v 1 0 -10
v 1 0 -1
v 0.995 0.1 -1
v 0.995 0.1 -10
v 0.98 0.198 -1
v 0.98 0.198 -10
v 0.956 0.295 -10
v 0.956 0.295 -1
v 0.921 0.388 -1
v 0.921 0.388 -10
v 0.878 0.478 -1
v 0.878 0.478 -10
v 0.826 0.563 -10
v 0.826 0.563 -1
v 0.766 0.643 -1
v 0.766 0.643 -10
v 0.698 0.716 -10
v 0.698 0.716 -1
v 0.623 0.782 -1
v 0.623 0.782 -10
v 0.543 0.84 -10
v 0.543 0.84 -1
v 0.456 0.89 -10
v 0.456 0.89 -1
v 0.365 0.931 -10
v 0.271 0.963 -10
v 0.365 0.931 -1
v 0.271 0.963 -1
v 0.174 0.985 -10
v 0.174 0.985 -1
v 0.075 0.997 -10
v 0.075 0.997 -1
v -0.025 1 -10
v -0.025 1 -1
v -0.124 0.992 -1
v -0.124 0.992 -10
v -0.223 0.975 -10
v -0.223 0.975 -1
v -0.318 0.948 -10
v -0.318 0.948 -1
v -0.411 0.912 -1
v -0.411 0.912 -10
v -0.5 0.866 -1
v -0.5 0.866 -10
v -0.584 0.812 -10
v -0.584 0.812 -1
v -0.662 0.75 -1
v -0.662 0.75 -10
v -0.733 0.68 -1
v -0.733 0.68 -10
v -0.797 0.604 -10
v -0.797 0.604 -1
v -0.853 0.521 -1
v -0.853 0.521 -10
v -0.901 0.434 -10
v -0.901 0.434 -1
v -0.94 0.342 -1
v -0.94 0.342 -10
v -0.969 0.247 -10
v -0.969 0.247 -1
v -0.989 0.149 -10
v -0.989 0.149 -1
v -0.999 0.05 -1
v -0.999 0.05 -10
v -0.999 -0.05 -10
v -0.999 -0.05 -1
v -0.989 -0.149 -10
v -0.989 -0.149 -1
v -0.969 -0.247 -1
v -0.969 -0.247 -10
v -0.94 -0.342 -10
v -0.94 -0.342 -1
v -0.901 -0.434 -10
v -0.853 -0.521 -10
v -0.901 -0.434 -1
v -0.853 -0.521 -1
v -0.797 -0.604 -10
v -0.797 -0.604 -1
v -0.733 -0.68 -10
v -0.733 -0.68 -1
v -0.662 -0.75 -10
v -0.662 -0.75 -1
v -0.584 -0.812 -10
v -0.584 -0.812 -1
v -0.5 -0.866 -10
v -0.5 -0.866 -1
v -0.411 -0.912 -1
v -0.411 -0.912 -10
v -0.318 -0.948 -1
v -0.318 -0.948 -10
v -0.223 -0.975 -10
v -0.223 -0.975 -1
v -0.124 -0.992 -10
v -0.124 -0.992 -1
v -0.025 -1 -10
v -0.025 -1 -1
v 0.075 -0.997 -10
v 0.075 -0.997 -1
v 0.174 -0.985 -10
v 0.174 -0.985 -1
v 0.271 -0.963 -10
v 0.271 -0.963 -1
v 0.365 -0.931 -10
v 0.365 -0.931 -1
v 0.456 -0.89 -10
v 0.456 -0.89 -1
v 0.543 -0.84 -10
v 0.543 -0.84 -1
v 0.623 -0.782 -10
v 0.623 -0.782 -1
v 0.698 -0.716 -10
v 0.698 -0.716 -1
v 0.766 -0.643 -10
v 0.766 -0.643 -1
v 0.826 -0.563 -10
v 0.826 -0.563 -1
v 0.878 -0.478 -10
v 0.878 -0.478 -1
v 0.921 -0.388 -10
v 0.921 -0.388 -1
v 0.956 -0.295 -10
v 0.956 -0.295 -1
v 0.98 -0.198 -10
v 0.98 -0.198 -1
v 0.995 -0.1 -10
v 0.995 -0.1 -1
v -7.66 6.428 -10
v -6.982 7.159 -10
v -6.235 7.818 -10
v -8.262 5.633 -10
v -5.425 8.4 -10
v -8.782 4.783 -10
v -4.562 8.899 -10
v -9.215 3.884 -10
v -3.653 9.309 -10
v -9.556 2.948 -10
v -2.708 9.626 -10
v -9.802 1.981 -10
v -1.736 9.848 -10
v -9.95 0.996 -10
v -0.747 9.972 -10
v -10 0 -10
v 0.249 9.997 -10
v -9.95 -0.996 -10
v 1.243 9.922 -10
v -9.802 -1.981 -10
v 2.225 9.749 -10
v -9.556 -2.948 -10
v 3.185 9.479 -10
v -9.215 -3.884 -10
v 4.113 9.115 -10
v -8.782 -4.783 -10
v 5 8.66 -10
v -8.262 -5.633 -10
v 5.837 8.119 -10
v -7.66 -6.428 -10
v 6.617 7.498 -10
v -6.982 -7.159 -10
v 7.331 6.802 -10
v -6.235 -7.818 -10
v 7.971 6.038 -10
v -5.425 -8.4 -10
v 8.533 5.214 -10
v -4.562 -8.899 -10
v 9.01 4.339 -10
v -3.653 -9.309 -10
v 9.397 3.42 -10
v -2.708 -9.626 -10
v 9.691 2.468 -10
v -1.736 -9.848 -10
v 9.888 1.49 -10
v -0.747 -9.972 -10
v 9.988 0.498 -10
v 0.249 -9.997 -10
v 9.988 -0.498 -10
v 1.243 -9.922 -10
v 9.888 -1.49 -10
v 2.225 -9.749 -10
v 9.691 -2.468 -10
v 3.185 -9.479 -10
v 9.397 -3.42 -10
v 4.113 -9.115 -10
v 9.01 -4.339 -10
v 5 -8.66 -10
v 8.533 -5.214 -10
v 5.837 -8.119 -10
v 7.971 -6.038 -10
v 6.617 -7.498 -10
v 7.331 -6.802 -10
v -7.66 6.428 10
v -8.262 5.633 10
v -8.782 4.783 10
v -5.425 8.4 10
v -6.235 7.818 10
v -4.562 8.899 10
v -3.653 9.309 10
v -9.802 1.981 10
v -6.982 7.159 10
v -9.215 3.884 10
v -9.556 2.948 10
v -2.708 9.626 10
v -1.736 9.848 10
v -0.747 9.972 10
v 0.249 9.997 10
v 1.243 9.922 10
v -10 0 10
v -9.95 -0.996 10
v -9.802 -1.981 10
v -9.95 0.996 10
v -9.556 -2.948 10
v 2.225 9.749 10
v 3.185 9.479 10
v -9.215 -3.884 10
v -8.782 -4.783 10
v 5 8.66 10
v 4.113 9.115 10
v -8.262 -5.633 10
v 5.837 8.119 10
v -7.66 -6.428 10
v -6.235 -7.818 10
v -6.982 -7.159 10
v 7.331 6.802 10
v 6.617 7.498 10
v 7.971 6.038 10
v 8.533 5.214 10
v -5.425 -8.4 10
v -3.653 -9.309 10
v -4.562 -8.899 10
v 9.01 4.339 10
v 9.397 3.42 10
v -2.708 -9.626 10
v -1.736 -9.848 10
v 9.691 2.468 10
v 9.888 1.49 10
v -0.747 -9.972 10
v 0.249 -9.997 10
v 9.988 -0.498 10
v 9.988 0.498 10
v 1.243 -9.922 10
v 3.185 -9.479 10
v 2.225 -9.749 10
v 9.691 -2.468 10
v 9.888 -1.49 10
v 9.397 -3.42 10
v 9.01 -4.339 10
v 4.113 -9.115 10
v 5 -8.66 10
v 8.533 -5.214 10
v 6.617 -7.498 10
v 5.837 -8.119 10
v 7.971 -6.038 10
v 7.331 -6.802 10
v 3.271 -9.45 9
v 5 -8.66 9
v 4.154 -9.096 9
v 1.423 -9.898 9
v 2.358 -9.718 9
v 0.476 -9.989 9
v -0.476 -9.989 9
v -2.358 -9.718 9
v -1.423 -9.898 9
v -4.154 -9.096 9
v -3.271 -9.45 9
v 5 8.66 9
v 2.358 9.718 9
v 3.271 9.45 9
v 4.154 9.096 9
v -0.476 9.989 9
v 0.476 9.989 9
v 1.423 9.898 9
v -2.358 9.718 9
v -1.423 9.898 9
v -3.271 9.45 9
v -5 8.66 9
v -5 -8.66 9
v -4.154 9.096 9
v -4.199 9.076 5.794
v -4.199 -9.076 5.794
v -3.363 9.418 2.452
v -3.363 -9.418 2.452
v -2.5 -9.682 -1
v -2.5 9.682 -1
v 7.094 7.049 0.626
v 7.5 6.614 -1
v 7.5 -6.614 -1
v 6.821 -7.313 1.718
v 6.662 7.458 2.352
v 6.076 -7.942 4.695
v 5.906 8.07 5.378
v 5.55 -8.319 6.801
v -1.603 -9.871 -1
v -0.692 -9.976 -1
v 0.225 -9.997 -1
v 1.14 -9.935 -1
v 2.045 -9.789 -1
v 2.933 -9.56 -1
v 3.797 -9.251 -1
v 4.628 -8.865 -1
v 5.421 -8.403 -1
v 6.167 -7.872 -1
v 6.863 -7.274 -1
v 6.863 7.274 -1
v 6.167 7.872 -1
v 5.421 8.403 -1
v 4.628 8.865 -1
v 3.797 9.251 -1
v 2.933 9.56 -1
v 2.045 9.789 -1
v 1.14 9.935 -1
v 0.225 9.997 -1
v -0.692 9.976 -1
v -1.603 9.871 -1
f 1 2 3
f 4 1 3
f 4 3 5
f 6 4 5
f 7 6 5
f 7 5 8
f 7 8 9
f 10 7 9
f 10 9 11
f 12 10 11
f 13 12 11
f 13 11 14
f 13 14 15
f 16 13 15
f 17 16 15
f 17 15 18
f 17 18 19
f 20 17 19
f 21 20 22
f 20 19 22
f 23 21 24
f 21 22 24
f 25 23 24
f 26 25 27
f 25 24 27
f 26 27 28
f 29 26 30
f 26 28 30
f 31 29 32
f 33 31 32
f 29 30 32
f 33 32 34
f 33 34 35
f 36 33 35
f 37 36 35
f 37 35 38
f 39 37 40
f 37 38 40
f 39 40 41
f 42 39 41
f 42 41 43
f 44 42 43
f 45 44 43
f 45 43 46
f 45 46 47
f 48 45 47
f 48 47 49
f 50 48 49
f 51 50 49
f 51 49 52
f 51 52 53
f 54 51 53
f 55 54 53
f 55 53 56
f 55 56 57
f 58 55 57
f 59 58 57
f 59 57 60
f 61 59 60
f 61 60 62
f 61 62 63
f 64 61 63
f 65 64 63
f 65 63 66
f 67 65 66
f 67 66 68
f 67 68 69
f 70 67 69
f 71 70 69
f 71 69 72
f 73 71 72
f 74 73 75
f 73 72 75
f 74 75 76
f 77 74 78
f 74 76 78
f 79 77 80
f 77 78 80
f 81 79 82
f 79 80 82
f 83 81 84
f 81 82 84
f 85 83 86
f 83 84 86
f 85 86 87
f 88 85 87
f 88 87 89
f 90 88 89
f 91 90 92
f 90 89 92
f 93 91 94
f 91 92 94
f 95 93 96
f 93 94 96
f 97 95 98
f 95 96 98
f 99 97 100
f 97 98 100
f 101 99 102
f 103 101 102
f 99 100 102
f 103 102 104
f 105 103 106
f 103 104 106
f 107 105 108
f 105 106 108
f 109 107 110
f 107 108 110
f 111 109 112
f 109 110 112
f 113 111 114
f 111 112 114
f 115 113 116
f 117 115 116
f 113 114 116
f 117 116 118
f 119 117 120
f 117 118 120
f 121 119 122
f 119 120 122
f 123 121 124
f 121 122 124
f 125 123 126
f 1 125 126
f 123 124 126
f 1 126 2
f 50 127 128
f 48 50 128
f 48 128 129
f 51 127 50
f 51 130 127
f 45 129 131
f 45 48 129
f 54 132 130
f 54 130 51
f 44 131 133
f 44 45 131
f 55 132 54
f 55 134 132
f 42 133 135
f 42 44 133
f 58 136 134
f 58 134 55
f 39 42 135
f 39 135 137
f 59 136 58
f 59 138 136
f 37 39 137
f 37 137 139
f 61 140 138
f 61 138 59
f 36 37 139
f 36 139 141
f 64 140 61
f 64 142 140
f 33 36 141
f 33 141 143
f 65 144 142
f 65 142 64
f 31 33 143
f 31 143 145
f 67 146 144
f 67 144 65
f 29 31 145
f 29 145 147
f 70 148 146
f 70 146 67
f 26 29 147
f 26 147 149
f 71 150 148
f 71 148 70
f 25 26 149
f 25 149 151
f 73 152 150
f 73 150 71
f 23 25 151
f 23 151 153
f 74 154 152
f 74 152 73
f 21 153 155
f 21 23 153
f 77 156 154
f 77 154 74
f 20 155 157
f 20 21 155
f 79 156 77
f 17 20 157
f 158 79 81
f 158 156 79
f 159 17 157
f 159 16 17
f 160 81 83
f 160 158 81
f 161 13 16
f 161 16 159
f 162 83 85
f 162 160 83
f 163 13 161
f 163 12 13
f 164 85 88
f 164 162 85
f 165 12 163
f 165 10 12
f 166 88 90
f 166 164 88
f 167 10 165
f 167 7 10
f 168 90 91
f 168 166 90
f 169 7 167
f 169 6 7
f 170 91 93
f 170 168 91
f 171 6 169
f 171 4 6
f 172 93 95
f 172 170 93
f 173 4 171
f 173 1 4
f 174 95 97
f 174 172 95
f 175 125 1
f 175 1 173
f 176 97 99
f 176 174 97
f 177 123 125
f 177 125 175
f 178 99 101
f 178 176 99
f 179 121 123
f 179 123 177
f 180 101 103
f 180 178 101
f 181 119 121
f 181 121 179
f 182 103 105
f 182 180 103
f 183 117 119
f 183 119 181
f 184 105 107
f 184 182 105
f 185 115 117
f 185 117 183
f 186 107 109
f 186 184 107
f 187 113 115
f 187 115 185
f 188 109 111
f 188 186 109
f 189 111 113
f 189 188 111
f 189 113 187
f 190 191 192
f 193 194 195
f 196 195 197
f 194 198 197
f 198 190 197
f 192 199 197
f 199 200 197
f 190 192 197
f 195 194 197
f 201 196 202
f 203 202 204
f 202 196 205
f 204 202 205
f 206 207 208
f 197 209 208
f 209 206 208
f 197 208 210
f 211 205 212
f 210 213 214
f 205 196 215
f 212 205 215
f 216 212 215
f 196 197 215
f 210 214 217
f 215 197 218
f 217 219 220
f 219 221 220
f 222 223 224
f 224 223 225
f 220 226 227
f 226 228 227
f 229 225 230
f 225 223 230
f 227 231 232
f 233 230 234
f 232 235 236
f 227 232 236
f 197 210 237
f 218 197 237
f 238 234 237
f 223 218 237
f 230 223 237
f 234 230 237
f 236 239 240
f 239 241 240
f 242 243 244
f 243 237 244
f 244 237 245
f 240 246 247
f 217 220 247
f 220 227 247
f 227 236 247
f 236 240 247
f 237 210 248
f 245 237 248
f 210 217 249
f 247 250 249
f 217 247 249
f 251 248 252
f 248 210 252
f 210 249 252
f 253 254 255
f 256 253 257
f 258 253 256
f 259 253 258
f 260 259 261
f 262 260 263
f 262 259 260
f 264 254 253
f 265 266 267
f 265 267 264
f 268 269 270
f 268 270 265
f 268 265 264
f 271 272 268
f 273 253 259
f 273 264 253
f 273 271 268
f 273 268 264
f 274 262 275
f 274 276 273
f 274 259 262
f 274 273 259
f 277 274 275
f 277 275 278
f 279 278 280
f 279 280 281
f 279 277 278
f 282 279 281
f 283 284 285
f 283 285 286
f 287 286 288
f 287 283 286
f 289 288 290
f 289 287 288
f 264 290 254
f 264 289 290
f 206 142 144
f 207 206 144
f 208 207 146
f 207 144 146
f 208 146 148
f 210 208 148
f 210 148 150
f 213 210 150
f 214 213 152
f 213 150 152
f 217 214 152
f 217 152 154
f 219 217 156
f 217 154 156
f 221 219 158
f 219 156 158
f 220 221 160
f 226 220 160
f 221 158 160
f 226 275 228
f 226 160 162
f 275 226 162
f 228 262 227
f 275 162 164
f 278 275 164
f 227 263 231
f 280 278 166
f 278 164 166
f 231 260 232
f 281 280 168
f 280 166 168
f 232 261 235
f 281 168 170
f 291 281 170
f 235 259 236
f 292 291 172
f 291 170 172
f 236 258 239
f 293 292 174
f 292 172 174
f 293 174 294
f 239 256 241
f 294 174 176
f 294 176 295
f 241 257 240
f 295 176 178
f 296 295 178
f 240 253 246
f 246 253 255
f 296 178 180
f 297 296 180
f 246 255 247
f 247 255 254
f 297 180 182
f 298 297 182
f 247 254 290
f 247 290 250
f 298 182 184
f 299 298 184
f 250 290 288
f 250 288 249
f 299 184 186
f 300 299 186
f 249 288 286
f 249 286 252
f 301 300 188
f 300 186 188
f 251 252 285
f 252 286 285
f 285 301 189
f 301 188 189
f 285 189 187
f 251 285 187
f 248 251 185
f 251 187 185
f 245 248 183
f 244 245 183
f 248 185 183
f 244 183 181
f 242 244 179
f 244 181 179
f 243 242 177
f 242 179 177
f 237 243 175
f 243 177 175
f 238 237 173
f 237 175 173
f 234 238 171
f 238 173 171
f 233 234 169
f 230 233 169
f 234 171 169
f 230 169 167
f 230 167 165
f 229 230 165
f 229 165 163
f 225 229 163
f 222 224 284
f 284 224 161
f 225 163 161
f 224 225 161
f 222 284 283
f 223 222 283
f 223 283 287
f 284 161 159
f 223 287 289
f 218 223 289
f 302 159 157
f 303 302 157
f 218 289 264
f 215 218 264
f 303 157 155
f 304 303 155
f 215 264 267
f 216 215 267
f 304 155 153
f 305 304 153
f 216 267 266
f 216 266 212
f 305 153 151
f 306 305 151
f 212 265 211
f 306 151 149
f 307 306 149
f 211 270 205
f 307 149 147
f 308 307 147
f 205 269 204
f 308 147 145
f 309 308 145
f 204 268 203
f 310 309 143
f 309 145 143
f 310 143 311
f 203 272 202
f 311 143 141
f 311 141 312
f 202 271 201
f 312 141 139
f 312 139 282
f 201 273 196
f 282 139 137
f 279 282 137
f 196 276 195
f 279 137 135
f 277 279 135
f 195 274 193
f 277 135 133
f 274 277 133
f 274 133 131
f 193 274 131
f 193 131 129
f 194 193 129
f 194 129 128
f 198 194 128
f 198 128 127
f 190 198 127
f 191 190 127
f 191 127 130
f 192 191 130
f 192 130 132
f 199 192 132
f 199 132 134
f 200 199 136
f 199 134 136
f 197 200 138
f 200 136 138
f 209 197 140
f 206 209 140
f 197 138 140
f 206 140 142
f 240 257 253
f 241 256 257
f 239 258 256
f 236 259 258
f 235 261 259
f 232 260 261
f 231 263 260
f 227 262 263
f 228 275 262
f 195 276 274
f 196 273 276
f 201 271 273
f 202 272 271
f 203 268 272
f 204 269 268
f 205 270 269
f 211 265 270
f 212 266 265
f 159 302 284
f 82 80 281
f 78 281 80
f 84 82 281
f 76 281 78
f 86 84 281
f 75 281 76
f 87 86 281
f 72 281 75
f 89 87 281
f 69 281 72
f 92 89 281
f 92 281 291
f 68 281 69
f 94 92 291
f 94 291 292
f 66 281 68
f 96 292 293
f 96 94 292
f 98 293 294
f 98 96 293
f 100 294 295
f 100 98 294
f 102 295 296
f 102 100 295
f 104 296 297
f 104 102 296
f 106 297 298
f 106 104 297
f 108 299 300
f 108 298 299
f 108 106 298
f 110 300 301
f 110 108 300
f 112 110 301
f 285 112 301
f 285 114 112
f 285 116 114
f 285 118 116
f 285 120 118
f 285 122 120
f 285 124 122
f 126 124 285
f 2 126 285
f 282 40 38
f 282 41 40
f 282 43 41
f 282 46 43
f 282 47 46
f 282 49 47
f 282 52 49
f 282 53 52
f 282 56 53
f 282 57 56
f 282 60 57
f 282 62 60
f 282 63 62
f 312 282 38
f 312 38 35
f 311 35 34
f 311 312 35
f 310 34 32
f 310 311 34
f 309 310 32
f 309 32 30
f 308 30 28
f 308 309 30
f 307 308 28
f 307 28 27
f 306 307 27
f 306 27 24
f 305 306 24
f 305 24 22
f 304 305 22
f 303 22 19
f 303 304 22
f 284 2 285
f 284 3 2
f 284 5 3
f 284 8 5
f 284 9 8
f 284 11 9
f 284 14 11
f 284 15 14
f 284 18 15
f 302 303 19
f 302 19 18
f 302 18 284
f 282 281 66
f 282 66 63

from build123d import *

# Parameters (mm, degrees)
SKETCH1_W                 = 10
SKETCH1_H                 = 20
CUT_EXTRUDE1_DEPTH        = 13
F_2_0MM_DOWEL_HOLE1_D     = 2
F_2_0MM_DOWEL_HOLE1_DEPTH = 10
F_2_0MM_DOWEL_HOLE1_TIP   = 0.600860619


with BuildPart() as part:
    # Sketch1 → Revolve1 (revolve)
    with BuildSketch(Plane(origin=(0, 0, 0), x_dir=(1, 0, 0), z_dir=(0, 1, 0)), mode=Mode.PRIVATE) as revolve1_sk:
        with Locations((5, 0)):
            Rectangle(SKETCH1_W, SKETCH1_H)
    revolve(revolve1_sk.sketch.rotate(Axis((0, 0, -10), (0, 0, 1)), 180), axis=Axis((0, 0, -10), (0, 0, 1)))

    # Sketch3 → Cut-Extrude1 (cut, symmetric)
    with BuildSketch(Plane(origin=(0, 0, 0), x_dir=(1, 0, 0), z_dir=(0, 1, 0))):
        Polygon((5, -9), (-5, -9), (-2.5, 1), (7.5, 1), align=None)
    extrude(amount=CUT_EXTRUDE1_DEPTH, both=True, mode=Mode.SUBTRACT)

    # Ø2.0mm Dowel Hole1
    with Locations(Plane(origin=(0, 0, -10), x_dir=(-1, 0, 0), z_dir=(0, 0, -1))):
        with Locations((0, 0)):
            Hole(F_2_0MM_DOWEL_HOLE1_D / 2, depth=F_2_0MM_DOWEL_HOLE1_DEPTH)
            with Locations((0, 0, -(F_2_0MM_DOWEL_HOLE1_DEPTH + F_2_0MM_DOWEL_HOLE1_TIP / 2))):  # 118° drill point
                Cone(0, F_2_0MM_DOWEL_HOLE1_D / 2, F_2_0MM_DOWEL_HOLE1_TIP, mode=Mode.SUBTRACT)


solid = part.part
